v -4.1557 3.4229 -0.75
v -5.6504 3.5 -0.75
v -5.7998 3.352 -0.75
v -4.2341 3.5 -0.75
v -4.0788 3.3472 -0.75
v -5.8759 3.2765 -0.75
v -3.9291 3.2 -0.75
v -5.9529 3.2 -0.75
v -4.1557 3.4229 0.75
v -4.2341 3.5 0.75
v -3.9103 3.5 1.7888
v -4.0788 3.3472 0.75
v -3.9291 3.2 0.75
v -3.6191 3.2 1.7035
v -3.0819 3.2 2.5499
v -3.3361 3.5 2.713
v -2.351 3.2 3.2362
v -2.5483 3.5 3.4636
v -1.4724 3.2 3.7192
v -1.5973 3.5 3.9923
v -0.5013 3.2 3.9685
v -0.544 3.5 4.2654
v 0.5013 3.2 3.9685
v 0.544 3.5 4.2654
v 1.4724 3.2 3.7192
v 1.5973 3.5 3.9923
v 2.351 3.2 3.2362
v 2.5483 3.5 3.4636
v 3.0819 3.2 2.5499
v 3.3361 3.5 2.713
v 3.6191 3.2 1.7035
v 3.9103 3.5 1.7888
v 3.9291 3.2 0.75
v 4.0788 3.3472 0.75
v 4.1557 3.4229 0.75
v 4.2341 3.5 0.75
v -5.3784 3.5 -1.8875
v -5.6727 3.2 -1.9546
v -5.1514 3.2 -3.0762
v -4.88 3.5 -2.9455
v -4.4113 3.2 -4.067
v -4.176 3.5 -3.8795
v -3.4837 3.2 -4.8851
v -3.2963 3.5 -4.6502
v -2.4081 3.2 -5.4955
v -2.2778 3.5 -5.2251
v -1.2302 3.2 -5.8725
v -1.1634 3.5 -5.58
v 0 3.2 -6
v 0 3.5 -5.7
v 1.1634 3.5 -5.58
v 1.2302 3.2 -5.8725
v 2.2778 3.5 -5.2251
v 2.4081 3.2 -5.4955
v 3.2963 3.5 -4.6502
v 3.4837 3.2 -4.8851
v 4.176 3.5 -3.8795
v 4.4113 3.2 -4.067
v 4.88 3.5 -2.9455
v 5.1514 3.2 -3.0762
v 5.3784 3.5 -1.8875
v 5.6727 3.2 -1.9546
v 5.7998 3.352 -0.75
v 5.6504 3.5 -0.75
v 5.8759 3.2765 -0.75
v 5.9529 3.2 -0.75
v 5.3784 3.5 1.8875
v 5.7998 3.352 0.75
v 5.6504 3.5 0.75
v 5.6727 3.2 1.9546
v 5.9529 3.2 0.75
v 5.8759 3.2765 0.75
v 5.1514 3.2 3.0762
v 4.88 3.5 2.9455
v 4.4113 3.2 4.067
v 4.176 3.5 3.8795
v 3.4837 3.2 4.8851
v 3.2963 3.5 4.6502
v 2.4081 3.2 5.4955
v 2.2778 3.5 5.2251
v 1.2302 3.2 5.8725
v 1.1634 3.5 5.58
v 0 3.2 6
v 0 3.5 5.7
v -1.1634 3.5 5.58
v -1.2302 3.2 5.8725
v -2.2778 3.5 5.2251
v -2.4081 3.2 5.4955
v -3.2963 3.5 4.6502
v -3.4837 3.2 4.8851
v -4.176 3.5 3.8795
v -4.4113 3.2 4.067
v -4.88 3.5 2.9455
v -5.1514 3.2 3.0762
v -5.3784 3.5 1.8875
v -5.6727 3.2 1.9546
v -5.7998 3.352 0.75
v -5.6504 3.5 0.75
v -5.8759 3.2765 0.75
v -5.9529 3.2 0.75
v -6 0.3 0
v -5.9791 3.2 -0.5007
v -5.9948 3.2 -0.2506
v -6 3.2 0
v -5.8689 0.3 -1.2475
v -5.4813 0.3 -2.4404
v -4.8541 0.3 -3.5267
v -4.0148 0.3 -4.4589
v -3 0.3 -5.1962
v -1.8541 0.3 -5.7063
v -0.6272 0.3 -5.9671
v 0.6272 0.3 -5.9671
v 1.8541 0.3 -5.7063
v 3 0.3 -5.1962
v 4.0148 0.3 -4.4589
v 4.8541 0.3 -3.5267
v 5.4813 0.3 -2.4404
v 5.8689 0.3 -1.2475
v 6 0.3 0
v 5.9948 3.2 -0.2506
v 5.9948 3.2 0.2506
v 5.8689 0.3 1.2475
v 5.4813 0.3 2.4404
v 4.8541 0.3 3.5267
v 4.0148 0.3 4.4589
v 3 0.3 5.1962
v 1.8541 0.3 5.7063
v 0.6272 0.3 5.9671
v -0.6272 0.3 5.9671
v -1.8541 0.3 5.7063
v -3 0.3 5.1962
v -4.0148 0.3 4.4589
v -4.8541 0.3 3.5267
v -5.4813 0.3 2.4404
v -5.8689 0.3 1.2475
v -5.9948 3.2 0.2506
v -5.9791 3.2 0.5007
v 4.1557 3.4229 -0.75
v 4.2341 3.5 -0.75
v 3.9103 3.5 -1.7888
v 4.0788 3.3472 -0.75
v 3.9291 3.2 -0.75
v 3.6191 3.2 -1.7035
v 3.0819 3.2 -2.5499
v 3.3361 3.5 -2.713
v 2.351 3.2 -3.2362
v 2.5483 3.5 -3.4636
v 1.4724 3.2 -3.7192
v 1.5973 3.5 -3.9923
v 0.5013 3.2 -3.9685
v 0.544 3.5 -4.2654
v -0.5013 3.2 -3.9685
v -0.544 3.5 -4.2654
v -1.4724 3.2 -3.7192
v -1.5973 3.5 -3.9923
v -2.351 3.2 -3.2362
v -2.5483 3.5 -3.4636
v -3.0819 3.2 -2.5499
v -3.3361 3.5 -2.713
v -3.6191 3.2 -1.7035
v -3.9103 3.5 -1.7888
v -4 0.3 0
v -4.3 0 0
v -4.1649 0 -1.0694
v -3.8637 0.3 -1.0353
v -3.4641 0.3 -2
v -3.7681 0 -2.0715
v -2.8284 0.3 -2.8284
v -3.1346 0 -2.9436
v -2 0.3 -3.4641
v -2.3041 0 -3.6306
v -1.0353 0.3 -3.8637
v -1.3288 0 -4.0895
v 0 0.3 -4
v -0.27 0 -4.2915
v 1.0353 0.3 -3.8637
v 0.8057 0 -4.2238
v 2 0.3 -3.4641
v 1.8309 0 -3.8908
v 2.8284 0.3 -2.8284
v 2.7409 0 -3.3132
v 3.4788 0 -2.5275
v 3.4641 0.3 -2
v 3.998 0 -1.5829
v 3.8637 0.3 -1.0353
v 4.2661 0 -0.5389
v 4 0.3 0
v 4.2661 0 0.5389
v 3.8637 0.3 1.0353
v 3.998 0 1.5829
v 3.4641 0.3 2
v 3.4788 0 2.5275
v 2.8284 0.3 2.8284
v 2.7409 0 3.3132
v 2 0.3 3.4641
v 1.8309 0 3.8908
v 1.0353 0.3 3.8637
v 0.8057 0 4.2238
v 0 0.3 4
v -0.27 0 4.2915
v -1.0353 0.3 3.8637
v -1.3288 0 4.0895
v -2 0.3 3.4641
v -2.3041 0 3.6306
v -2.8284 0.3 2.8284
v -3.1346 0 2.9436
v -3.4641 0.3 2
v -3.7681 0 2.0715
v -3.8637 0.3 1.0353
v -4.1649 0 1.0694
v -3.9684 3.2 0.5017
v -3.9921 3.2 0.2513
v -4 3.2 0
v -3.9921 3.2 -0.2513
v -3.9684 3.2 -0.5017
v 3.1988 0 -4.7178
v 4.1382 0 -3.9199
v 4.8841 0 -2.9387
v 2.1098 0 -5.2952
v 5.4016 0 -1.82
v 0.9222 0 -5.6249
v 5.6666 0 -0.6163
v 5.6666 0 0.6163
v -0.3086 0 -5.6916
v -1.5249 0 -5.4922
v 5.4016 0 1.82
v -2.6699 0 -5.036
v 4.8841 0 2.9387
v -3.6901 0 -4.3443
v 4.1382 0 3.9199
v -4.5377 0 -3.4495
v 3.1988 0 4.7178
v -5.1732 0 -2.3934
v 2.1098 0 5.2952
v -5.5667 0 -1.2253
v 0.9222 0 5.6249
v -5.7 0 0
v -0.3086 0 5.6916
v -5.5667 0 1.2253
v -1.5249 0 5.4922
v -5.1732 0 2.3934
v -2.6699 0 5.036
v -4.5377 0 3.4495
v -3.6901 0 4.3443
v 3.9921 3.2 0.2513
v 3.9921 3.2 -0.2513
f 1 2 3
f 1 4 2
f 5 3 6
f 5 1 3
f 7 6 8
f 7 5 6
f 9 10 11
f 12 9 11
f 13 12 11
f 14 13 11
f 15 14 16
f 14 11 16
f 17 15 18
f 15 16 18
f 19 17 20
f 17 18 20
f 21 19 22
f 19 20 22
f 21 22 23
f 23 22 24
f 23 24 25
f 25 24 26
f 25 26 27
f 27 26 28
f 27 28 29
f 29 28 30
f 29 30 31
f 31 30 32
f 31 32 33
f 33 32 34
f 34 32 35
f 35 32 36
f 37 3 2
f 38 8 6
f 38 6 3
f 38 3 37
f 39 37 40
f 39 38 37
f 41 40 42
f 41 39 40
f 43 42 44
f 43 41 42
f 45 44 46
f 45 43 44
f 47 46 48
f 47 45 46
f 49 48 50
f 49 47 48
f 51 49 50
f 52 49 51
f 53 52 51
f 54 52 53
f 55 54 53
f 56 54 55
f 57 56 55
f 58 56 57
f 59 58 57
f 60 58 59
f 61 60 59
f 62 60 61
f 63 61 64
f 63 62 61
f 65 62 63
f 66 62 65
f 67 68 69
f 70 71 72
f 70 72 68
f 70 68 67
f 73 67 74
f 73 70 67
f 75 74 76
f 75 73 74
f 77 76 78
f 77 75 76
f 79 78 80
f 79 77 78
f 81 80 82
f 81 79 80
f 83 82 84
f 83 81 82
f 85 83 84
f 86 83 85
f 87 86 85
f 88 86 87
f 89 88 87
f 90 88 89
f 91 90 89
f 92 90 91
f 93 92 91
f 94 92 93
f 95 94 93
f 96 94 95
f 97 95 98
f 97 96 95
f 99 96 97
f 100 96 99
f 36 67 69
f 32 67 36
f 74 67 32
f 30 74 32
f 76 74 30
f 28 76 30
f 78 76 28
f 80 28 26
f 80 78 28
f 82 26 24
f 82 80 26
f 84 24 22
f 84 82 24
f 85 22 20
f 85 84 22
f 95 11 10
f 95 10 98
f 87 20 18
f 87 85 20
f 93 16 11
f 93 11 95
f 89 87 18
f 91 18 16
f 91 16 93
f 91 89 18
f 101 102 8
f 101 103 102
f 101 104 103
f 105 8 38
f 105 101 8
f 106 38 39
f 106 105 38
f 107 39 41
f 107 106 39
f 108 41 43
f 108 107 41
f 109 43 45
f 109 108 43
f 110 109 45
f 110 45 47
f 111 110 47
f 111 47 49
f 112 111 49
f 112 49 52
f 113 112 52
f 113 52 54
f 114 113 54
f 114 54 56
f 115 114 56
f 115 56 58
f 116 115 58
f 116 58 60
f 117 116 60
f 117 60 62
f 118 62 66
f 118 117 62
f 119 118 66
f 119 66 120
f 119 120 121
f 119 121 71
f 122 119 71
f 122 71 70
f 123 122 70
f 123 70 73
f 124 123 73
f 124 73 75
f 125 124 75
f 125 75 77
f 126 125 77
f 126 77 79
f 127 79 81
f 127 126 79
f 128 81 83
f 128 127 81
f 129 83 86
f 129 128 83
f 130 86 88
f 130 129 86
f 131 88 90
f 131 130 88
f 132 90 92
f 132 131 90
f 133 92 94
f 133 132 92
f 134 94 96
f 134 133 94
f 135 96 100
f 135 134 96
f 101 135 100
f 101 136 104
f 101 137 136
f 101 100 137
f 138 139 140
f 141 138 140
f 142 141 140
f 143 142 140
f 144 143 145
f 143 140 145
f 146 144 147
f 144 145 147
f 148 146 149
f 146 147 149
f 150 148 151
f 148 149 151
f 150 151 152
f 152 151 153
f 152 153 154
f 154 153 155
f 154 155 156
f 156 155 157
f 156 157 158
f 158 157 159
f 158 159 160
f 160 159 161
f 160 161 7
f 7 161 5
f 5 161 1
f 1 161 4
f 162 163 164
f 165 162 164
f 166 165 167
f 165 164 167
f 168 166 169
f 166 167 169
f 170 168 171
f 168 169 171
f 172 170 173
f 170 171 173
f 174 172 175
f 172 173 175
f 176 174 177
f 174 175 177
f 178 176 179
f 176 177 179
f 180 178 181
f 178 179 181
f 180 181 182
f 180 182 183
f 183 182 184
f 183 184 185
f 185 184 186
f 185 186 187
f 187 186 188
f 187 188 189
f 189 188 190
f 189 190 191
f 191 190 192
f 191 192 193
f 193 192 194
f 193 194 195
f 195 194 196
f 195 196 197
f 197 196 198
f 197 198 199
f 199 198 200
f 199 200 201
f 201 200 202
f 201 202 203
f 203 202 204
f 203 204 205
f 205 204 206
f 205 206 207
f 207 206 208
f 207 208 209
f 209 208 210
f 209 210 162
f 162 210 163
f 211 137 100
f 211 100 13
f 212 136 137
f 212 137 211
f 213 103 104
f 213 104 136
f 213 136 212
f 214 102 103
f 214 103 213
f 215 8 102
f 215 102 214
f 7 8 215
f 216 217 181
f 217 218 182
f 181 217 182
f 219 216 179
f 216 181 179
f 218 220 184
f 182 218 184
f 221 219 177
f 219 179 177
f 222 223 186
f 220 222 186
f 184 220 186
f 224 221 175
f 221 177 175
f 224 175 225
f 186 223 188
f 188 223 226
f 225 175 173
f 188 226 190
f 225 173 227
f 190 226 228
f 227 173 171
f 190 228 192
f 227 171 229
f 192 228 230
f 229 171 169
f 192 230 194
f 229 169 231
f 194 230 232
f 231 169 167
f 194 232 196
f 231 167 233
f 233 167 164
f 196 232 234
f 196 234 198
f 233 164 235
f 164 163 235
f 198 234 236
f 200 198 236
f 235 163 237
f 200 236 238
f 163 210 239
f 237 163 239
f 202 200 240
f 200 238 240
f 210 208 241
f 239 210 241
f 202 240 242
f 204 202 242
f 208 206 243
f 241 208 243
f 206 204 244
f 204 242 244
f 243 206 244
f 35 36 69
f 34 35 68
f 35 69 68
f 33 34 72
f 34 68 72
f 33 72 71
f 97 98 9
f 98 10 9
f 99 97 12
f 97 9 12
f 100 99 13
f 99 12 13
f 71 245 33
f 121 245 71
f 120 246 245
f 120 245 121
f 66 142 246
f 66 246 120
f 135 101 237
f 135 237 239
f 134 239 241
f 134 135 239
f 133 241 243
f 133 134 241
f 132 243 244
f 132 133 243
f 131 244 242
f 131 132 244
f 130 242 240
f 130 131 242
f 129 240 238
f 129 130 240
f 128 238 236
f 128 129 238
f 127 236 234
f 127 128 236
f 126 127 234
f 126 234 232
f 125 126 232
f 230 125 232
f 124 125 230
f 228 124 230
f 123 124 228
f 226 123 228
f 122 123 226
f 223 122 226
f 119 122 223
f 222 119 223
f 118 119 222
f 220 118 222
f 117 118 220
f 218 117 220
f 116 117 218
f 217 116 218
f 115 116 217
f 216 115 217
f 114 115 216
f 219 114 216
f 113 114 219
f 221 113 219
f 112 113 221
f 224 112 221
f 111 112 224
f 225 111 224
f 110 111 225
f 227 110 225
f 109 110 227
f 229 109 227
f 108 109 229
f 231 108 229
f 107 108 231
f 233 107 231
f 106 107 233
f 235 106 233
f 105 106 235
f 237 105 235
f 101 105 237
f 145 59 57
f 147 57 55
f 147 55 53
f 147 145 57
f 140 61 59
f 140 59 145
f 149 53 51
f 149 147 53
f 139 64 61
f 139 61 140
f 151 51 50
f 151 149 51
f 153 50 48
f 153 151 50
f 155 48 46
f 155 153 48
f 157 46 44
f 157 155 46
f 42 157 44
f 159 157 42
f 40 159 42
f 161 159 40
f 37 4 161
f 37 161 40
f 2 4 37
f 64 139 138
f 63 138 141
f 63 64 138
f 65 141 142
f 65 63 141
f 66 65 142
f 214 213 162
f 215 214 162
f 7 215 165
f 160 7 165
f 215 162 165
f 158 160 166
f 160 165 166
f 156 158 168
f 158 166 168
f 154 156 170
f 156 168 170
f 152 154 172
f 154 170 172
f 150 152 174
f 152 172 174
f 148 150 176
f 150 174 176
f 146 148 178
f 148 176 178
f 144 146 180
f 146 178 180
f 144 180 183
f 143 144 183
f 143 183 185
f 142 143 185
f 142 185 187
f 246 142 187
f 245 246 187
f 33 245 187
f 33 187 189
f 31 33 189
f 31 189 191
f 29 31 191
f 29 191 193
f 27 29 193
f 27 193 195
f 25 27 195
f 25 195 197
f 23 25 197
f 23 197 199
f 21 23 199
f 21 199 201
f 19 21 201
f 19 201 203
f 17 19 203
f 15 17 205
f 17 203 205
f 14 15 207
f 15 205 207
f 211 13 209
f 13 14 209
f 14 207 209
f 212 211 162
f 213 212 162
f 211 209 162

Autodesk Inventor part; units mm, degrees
ref_plane "YZ Plane" through (0, 0, 0) normal (1, 0, 0) x (0, 1, 0)
ref_plane "XZ Plane" through (0, 0, 0) normal (0, 1, 0) x (-1, 0, 0)
ref_plane "XY Plane" through (0, 0, 0) normal (0, 0, 1) x (1, 0, 0)
sketch "スケッチ1" plane through (0, 0, 0) normal (0, 1, 0) x (-1, 0, 0)
  circle A0 centre (0, 0) radius 6
  circle A1 centre (0, 0) radius 4
  dimension "d0" = 12
  dimension "d1" = 8
extrude "押し出し1" add sketch "スケッチ1" along normal blind 3.5
sketch "スケッチ2" plane through (0, 3.5, 0) normal (0, 1, 0) x (1, 0, 0)
  circle A0 centre (0, 0) radius 6 projected
  line L0 (-6, 0) -> (6, 0)
  line L1 (-6, 0.75) -> (6, 0.75)
  line L2 (-6, 0.75) -> (-6, 0)
  line L3 (6, 0.75) -> (6, 0)
  line L4 (-6, -0.75) -> (6, -0.75)
  line L5 (-6, -0.75) -> (-6, 0)
  line L6 (6, -0.75) -> (6, 0)
  point P0 (5.9529, 0.75)
  point P1 (-5.9529, 0.75)
  point P2 (-5.9529, -0.75)
  point P3 (5.9529, -0.75)
  dimension "d4" = 0.75
extrude "押し出し2" cut sketch "スケッチ2" against normal blind 0.3 contours L0 A0 L1 | A0 L4 L0
chamfer "面取り1" distance 0.3 angle 45 6 edges at (0, 3.5, 4) (0, 3.5, -4) (0, 3.5, -6) (0, 3.5, 6) (6, 0, 0) (4, 0, 0)
properties part number "GSB-081235"
